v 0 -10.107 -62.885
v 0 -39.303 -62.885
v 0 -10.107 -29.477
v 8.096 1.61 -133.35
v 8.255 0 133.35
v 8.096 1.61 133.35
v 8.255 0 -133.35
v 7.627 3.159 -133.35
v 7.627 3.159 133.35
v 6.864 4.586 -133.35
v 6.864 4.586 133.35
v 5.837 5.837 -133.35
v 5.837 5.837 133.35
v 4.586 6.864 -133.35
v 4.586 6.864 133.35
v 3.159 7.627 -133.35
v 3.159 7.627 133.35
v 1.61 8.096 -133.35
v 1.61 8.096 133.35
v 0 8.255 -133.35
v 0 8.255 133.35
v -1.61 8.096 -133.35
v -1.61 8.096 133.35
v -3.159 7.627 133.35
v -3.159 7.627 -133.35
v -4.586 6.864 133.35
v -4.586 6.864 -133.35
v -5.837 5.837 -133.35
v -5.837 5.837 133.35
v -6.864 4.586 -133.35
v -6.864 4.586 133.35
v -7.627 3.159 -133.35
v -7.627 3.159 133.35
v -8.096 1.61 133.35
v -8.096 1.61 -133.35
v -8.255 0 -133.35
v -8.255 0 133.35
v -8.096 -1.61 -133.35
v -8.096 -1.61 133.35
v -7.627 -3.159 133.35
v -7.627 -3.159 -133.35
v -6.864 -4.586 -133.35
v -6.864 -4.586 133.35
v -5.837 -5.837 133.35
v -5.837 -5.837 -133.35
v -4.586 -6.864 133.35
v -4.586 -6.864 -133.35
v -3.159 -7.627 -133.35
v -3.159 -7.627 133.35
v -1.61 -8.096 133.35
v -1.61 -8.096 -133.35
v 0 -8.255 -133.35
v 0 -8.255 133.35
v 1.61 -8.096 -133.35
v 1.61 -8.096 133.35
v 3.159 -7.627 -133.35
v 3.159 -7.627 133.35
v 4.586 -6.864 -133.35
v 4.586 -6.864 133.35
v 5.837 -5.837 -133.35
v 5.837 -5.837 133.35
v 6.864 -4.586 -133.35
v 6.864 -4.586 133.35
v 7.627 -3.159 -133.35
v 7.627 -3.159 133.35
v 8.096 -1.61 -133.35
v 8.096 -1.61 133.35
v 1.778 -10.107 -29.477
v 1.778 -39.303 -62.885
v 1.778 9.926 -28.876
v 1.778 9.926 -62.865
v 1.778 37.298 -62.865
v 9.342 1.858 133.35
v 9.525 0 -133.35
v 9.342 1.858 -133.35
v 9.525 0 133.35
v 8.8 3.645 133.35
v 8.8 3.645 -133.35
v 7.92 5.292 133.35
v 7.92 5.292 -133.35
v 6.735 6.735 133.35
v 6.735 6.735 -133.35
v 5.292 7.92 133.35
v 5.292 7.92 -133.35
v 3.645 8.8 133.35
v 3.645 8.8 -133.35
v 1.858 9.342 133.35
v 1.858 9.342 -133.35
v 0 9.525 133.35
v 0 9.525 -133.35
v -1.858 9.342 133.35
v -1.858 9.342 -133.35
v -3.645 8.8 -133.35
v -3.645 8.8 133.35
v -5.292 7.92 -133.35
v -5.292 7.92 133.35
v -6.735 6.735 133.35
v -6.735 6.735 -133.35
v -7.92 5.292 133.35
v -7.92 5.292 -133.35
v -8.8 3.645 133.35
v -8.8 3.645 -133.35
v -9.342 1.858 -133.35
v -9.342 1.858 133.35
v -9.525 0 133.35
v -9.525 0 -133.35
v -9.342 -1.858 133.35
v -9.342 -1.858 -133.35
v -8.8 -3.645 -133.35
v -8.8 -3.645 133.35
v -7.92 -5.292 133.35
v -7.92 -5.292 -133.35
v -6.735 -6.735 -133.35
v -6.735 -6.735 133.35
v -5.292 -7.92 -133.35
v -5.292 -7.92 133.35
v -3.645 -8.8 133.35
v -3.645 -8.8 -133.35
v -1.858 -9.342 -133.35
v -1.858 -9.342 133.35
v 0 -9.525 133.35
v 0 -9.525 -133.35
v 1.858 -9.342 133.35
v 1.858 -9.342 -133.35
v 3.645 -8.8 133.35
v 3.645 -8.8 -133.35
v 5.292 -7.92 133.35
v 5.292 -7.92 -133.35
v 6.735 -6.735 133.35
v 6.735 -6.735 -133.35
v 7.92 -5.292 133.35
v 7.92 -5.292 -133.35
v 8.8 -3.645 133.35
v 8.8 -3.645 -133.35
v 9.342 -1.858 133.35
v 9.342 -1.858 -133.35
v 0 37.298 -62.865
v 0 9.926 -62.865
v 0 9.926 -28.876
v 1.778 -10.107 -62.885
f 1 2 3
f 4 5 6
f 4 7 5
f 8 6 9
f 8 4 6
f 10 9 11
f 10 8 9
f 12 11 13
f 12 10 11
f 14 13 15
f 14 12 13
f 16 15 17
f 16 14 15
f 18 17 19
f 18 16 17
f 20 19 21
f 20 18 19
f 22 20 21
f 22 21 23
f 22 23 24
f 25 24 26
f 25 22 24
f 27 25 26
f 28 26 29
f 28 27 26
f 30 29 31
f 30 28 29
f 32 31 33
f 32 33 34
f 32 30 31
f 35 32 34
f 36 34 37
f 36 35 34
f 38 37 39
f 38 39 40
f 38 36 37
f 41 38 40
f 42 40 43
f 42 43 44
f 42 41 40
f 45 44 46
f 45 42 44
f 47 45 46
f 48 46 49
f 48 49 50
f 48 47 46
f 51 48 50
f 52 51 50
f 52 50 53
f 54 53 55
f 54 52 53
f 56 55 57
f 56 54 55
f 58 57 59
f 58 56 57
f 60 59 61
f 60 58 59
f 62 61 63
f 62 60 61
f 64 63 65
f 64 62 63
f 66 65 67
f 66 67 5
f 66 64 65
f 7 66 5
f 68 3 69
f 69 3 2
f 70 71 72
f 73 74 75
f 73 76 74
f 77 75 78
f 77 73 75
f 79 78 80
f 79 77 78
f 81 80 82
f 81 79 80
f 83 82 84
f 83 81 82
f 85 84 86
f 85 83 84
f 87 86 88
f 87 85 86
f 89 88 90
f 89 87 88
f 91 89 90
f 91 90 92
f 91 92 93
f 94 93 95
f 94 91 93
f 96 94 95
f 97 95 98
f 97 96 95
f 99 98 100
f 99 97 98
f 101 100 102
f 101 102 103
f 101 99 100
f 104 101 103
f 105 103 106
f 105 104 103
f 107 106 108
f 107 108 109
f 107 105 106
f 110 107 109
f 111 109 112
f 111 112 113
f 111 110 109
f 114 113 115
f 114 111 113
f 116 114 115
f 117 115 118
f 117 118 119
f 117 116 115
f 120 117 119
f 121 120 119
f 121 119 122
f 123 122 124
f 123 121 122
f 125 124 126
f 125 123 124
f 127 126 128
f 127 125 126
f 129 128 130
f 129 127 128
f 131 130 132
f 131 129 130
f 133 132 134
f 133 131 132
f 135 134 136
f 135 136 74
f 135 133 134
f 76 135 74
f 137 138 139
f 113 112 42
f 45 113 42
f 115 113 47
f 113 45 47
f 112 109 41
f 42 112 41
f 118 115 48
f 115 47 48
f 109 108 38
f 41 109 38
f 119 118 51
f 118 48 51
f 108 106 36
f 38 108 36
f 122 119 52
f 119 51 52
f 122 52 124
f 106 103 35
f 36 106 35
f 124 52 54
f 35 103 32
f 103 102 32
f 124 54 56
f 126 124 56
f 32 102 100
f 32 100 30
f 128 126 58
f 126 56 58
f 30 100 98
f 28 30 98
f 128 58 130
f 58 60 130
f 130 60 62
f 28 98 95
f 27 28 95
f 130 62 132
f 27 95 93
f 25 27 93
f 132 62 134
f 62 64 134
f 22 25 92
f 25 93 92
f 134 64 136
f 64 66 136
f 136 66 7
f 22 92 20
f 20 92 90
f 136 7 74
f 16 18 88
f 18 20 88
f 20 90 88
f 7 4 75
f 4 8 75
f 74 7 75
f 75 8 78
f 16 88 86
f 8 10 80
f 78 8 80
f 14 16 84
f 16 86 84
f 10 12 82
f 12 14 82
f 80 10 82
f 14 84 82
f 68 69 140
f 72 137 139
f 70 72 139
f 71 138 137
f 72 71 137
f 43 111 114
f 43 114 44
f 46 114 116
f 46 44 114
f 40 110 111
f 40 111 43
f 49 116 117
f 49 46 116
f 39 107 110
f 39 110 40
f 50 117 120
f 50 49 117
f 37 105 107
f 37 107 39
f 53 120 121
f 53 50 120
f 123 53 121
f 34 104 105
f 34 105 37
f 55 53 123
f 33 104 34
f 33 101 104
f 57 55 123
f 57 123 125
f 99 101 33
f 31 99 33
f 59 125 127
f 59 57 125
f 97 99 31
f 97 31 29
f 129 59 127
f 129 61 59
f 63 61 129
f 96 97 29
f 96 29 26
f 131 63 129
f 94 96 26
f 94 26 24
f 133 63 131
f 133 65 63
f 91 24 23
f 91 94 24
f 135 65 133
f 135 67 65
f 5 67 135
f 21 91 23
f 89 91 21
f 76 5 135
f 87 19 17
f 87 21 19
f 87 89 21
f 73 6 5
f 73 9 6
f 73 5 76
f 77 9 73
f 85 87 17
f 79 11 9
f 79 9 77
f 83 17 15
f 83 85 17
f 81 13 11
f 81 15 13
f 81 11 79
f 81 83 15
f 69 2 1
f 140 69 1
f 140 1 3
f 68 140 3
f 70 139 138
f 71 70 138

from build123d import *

# Parameters (mm, degrees)
F0_R     = 9.525
F0_R_2   = 8.255
F1_DEPTH = 133.35
F4_DEPTH = 1.778


with BuildPart() as f1:
    # F0 (on Top) → F1 (new body, symmetric)
    with BuildSketch(Plane.XY):
        Circle(F0_R)
        Circle(F0_R_2, mode=Mode.SUBTRACT)
    extrude(amount=F1_DEPTH, both=True)


with BuildPart() as f4:
    # F2 (on Right) + F3 (on Right) → F4 (new body)
    with BuildSketch(Plane.YZ):
        Polygon((9.926053, -28.875791), (9.926053, -62.865004), (37.297897, -62.865004), align=None)
    with BuildSketch(Plane.YZ):
        Polygon((-39.303157, -62.885053), (-10.106525, -62.885053), (-10.106525, -29.477369), align=None)
    extrude(amount=F4_DEPTH)


solid = Compound([f1.part, f4.part])
